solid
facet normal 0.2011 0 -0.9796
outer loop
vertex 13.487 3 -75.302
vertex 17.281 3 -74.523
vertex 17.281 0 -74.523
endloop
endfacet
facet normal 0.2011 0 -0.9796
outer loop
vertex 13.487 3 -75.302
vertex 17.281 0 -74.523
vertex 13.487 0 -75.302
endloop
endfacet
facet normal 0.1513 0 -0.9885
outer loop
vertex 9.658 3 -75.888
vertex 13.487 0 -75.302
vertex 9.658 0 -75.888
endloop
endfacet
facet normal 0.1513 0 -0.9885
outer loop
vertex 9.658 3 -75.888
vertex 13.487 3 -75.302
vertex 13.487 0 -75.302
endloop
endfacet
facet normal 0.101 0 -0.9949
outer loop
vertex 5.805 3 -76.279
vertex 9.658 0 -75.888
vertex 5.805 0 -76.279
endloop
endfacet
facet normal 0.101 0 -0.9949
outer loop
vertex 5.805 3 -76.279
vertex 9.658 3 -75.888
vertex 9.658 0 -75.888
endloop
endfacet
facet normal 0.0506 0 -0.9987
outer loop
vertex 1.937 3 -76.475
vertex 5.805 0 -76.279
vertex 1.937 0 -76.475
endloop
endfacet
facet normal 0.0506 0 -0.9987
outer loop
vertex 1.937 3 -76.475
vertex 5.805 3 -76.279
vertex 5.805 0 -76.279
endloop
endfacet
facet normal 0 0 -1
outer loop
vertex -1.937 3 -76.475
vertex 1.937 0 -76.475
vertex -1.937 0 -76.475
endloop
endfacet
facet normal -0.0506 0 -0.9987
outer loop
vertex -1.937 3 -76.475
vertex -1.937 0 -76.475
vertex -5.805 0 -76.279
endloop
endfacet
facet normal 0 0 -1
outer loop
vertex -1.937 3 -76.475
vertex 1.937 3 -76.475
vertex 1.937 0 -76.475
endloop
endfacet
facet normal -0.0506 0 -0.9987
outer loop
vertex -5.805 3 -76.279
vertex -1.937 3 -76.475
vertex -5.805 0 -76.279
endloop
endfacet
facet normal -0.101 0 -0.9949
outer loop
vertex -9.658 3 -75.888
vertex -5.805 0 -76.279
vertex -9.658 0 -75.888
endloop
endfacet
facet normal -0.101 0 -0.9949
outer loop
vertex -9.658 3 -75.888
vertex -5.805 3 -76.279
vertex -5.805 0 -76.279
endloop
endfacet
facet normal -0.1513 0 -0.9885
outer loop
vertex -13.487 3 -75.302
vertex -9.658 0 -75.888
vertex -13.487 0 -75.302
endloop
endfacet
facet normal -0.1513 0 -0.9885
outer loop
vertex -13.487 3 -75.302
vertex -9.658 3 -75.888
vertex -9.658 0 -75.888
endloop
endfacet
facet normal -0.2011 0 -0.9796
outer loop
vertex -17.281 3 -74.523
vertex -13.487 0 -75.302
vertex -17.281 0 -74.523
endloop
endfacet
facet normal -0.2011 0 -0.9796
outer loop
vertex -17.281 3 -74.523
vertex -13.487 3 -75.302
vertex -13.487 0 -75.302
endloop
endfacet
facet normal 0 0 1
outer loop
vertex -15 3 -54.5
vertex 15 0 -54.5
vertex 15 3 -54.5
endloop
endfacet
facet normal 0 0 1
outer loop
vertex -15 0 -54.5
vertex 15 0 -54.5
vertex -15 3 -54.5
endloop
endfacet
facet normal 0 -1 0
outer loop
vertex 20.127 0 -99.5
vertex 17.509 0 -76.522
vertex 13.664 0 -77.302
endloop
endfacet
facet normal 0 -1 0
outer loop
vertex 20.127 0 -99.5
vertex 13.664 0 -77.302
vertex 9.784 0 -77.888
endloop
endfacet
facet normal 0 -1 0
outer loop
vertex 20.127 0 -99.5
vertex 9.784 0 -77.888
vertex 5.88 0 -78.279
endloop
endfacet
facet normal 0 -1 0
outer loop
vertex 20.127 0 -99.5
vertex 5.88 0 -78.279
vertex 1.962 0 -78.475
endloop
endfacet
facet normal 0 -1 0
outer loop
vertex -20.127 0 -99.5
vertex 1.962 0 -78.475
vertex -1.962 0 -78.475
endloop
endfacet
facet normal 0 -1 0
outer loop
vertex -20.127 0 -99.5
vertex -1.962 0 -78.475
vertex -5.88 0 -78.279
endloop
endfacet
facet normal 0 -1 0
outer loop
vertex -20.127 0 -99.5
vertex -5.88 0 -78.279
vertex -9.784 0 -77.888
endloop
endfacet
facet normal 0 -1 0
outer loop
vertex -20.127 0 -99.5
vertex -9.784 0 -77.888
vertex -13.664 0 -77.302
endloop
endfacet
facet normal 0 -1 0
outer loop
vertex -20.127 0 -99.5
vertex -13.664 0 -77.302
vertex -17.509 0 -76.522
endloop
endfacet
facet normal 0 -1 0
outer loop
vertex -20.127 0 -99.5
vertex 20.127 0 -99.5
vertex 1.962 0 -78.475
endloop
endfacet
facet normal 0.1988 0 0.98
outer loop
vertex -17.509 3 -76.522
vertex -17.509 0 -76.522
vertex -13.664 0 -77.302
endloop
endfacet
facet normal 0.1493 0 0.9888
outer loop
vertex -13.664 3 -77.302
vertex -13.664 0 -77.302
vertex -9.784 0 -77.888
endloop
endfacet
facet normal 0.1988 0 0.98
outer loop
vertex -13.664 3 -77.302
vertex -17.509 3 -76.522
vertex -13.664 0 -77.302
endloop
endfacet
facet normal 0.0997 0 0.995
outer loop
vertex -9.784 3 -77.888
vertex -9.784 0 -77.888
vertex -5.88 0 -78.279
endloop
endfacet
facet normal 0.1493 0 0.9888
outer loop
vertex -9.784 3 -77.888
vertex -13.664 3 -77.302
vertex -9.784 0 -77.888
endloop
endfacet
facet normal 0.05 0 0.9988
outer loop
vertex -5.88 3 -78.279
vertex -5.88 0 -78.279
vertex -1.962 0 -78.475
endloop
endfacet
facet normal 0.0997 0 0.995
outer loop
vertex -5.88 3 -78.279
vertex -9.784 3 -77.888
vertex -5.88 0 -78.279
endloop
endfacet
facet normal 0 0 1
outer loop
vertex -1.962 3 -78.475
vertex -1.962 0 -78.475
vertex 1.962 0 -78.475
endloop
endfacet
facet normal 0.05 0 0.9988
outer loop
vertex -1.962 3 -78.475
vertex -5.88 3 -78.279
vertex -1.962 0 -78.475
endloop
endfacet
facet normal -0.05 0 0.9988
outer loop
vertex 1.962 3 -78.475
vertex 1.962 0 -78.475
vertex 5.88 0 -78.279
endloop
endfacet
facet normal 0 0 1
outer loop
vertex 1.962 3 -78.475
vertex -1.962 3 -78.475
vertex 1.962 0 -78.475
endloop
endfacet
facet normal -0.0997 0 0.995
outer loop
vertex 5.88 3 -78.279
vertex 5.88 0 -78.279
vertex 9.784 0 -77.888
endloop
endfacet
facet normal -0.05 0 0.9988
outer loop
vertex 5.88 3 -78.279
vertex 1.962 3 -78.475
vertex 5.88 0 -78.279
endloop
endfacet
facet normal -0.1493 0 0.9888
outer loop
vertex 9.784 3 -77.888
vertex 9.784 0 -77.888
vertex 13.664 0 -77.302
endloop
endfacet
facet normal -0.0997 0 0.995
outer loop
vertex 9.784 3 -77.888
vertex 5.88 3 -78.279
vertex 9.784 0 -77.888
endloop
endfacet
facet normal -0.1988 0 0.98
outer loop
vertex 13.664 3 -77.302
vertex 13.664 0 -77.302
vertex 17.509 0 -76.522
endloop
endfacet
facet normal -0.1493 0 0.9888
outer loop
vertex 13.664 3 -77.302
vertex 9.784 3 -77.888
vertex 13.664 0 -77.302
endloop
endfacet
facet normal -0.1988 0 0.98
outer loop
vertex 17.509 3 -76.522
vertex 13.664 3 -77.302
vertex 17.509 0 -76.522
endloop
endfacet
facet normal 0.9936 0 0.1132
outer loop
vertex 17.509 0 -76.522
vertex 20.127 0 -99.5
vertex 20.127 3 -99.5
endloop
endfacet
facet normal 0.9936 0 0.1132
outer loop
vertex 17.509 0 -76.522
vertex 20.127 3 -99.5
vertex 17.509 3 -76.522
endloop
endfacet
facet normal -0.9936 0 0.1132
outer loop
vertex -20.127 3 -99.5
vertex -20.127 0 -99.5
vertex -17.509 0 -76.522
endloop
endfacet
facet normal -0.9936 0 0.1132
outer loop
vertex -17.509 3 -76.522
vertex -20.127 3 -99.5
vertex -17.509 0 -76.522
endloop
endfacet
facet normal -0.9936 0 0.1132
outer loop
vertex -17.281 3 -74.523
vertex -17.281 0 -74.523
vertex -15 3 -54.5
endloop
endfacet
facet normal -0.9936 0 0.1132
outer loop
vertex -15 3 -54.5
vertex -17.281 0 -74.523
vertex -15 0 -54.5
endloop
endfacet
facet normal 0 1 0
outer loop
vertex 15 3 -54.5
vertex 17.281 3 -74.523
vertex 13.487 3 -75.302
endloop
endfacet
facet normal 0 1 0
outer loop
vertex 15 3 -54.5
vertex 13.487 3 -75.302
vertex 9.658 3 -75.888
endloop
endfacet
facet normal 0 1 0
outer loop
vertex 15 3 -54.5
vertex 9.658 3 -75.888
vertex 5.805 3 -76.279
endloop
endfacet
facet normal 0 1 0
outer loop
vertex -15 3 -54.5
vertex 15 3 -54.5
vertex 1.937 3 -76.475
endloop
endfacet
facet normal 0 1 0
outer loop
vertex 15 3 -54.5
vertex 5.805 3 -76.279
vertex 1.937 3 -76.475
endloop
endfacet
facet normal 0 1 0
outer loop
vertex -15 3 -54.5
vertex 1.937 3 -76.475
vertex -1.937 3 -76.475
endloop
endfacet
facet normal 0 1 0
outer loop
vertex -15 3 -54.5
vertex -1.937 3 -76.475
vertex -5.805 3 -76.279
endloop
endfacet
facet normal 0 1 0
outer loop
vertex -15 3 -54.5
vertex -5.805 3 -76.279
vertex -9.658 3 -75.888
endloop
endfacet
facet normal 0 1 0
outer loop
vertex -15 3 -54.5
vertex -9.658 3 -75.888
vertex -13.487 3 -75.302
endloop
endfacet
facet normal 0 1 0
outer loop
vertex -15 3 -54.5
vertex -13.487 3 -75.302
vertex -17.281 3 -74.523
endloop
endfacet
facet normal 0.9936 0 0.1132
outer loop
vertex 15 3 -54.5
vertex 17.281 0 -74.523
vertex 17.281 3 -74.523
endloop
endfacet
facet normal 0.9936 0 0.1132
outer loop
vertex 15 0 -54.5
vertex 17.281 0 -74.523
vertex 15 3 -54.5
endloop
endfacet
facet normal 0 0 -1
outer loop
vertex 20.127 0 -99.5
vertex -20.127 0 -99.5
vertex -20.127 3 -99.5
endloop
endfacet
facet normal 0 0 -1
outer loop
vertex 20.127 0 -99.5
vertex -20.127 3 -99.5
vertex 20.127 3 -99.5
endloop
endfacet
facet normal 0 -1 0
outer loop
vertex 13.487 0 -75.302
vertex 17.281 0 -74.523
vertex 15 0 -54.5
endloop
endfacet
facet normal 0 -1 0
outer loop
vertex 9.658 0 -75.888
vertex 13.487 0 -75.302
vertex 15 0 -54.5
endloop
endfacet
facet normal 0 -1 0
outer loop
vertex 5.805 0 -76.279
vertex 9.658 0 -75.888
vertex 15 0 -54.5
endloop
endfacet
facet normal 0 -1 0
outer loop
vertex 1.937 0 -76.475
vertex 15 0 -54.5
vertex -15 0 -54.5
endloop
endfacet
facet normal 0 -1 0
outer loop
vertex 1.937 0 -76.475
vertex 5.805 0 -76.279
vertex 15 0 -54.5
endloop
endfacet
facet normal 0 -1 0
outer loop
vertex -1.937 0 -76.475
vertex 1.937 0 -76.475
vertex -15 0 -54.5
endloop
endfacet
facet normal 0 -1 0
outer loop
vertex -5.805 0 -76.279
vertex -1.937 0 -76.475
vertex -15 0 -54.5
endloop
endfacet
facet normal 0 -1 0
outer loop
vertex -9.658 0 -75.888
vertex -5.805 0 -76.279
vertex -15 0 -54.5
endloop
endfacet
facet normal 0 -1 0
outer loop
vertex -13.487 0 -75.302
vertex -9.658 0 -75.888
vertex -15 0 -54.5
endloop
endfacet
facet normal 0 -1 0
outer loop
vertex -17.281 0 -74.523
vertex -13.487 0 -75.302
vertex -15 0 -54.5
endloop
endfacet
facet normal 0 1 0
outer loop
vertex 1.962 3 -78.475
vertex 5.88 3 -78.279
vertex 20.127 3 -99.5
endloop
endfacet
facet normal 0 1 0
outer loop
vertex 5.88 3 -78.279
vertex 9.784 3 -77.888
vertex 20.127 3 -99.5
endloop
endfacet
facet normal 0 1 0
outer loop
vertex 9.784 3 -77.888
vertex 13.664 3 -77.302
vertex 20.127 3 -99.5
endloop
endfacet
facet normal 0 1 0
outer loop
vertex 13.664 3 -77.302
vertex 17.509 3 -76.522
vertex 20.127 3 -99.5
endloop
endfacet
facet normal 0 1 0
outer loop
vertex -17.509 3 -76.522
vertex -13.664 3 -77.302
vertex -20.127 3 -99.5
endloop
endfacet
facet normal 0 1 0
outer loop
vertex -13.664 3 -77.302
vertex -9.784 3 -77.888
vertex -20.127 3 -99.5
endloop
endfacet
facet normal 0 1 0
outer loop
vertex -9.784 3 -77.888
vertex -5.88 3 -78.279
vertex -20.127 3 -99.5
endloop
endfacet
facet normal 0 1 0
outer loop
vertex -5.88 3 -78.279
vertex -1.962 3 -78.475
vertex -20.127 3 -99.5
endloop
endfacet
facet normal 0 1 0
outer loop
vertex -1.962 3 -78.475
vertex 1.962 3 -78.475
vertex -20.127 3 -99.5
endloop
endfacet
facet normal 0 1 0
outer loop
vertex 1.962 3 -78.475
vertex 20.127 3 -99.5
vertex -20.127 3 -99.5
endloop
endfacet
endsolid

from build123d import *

# Parameters (mm, degrees)
BOSS_EXTRUDE1_DEPTH     = 3
CUT_EXTRUDE1_DEPTH      = 1
CUT_EXTRUDE1_DEPTH_BACK = 4


with BuildPart() as part:
    # Sketch1 → Boss-Extrude1 (new body)
    with BuildSketch(Plane(origin=(0, 0, 0), x_dir=(1, 0, 0), z_dir=(0, 1, 0))):
        Polygon((-20.127102374, 99.5), (-15, 54.5), (0, 54.5), (0, 99.5), align=None)
    boss_extrude1 = extrude(amount=BOSS_EXTRUDE1_DEPTH)

    # Mirror2: Boss-Extrude1 across plane
    add(boss_extrude1.mirror(Plane(origin=(0, 0, 0), x_dir=(0, 0, 1), z_dir=(1, 0, 0))))

    # Sketch2 → Cut-Extrude1 (cut, two sides)
    with BuildSketch(Plane(origin=(0, 3, 0), x_dir=(1, 0, 0), z_dir=(0, 1, 0))) as cut_extrude1_sk:
        with BuildLine():
            Line((-17.281279071, 74.522529437), (-17.509137333, 76.522415735))
            ThreePointArc((-17.509137333, 76.522415735), (0, 78.5), (17.509137333, 76.522415735))
            Line((17.509137333, 76.522415735), (17.281279071, 74.522529437))
            ThreePointArc((17.281279071, 74.522529437), (0, 76.5), (-17.281279071, 74.522529437))
        make_face()
    extrude(amount=CUT_EXTRUDE1_DEPTH, mode=Mode.SUBTRACT)
    extrude(cut_extrude1_sk.sketch, amount=-CUT_EXTRUDE1_DEPTH_BACK, mode=Mode.SUBTRACT)


solid = part.part
